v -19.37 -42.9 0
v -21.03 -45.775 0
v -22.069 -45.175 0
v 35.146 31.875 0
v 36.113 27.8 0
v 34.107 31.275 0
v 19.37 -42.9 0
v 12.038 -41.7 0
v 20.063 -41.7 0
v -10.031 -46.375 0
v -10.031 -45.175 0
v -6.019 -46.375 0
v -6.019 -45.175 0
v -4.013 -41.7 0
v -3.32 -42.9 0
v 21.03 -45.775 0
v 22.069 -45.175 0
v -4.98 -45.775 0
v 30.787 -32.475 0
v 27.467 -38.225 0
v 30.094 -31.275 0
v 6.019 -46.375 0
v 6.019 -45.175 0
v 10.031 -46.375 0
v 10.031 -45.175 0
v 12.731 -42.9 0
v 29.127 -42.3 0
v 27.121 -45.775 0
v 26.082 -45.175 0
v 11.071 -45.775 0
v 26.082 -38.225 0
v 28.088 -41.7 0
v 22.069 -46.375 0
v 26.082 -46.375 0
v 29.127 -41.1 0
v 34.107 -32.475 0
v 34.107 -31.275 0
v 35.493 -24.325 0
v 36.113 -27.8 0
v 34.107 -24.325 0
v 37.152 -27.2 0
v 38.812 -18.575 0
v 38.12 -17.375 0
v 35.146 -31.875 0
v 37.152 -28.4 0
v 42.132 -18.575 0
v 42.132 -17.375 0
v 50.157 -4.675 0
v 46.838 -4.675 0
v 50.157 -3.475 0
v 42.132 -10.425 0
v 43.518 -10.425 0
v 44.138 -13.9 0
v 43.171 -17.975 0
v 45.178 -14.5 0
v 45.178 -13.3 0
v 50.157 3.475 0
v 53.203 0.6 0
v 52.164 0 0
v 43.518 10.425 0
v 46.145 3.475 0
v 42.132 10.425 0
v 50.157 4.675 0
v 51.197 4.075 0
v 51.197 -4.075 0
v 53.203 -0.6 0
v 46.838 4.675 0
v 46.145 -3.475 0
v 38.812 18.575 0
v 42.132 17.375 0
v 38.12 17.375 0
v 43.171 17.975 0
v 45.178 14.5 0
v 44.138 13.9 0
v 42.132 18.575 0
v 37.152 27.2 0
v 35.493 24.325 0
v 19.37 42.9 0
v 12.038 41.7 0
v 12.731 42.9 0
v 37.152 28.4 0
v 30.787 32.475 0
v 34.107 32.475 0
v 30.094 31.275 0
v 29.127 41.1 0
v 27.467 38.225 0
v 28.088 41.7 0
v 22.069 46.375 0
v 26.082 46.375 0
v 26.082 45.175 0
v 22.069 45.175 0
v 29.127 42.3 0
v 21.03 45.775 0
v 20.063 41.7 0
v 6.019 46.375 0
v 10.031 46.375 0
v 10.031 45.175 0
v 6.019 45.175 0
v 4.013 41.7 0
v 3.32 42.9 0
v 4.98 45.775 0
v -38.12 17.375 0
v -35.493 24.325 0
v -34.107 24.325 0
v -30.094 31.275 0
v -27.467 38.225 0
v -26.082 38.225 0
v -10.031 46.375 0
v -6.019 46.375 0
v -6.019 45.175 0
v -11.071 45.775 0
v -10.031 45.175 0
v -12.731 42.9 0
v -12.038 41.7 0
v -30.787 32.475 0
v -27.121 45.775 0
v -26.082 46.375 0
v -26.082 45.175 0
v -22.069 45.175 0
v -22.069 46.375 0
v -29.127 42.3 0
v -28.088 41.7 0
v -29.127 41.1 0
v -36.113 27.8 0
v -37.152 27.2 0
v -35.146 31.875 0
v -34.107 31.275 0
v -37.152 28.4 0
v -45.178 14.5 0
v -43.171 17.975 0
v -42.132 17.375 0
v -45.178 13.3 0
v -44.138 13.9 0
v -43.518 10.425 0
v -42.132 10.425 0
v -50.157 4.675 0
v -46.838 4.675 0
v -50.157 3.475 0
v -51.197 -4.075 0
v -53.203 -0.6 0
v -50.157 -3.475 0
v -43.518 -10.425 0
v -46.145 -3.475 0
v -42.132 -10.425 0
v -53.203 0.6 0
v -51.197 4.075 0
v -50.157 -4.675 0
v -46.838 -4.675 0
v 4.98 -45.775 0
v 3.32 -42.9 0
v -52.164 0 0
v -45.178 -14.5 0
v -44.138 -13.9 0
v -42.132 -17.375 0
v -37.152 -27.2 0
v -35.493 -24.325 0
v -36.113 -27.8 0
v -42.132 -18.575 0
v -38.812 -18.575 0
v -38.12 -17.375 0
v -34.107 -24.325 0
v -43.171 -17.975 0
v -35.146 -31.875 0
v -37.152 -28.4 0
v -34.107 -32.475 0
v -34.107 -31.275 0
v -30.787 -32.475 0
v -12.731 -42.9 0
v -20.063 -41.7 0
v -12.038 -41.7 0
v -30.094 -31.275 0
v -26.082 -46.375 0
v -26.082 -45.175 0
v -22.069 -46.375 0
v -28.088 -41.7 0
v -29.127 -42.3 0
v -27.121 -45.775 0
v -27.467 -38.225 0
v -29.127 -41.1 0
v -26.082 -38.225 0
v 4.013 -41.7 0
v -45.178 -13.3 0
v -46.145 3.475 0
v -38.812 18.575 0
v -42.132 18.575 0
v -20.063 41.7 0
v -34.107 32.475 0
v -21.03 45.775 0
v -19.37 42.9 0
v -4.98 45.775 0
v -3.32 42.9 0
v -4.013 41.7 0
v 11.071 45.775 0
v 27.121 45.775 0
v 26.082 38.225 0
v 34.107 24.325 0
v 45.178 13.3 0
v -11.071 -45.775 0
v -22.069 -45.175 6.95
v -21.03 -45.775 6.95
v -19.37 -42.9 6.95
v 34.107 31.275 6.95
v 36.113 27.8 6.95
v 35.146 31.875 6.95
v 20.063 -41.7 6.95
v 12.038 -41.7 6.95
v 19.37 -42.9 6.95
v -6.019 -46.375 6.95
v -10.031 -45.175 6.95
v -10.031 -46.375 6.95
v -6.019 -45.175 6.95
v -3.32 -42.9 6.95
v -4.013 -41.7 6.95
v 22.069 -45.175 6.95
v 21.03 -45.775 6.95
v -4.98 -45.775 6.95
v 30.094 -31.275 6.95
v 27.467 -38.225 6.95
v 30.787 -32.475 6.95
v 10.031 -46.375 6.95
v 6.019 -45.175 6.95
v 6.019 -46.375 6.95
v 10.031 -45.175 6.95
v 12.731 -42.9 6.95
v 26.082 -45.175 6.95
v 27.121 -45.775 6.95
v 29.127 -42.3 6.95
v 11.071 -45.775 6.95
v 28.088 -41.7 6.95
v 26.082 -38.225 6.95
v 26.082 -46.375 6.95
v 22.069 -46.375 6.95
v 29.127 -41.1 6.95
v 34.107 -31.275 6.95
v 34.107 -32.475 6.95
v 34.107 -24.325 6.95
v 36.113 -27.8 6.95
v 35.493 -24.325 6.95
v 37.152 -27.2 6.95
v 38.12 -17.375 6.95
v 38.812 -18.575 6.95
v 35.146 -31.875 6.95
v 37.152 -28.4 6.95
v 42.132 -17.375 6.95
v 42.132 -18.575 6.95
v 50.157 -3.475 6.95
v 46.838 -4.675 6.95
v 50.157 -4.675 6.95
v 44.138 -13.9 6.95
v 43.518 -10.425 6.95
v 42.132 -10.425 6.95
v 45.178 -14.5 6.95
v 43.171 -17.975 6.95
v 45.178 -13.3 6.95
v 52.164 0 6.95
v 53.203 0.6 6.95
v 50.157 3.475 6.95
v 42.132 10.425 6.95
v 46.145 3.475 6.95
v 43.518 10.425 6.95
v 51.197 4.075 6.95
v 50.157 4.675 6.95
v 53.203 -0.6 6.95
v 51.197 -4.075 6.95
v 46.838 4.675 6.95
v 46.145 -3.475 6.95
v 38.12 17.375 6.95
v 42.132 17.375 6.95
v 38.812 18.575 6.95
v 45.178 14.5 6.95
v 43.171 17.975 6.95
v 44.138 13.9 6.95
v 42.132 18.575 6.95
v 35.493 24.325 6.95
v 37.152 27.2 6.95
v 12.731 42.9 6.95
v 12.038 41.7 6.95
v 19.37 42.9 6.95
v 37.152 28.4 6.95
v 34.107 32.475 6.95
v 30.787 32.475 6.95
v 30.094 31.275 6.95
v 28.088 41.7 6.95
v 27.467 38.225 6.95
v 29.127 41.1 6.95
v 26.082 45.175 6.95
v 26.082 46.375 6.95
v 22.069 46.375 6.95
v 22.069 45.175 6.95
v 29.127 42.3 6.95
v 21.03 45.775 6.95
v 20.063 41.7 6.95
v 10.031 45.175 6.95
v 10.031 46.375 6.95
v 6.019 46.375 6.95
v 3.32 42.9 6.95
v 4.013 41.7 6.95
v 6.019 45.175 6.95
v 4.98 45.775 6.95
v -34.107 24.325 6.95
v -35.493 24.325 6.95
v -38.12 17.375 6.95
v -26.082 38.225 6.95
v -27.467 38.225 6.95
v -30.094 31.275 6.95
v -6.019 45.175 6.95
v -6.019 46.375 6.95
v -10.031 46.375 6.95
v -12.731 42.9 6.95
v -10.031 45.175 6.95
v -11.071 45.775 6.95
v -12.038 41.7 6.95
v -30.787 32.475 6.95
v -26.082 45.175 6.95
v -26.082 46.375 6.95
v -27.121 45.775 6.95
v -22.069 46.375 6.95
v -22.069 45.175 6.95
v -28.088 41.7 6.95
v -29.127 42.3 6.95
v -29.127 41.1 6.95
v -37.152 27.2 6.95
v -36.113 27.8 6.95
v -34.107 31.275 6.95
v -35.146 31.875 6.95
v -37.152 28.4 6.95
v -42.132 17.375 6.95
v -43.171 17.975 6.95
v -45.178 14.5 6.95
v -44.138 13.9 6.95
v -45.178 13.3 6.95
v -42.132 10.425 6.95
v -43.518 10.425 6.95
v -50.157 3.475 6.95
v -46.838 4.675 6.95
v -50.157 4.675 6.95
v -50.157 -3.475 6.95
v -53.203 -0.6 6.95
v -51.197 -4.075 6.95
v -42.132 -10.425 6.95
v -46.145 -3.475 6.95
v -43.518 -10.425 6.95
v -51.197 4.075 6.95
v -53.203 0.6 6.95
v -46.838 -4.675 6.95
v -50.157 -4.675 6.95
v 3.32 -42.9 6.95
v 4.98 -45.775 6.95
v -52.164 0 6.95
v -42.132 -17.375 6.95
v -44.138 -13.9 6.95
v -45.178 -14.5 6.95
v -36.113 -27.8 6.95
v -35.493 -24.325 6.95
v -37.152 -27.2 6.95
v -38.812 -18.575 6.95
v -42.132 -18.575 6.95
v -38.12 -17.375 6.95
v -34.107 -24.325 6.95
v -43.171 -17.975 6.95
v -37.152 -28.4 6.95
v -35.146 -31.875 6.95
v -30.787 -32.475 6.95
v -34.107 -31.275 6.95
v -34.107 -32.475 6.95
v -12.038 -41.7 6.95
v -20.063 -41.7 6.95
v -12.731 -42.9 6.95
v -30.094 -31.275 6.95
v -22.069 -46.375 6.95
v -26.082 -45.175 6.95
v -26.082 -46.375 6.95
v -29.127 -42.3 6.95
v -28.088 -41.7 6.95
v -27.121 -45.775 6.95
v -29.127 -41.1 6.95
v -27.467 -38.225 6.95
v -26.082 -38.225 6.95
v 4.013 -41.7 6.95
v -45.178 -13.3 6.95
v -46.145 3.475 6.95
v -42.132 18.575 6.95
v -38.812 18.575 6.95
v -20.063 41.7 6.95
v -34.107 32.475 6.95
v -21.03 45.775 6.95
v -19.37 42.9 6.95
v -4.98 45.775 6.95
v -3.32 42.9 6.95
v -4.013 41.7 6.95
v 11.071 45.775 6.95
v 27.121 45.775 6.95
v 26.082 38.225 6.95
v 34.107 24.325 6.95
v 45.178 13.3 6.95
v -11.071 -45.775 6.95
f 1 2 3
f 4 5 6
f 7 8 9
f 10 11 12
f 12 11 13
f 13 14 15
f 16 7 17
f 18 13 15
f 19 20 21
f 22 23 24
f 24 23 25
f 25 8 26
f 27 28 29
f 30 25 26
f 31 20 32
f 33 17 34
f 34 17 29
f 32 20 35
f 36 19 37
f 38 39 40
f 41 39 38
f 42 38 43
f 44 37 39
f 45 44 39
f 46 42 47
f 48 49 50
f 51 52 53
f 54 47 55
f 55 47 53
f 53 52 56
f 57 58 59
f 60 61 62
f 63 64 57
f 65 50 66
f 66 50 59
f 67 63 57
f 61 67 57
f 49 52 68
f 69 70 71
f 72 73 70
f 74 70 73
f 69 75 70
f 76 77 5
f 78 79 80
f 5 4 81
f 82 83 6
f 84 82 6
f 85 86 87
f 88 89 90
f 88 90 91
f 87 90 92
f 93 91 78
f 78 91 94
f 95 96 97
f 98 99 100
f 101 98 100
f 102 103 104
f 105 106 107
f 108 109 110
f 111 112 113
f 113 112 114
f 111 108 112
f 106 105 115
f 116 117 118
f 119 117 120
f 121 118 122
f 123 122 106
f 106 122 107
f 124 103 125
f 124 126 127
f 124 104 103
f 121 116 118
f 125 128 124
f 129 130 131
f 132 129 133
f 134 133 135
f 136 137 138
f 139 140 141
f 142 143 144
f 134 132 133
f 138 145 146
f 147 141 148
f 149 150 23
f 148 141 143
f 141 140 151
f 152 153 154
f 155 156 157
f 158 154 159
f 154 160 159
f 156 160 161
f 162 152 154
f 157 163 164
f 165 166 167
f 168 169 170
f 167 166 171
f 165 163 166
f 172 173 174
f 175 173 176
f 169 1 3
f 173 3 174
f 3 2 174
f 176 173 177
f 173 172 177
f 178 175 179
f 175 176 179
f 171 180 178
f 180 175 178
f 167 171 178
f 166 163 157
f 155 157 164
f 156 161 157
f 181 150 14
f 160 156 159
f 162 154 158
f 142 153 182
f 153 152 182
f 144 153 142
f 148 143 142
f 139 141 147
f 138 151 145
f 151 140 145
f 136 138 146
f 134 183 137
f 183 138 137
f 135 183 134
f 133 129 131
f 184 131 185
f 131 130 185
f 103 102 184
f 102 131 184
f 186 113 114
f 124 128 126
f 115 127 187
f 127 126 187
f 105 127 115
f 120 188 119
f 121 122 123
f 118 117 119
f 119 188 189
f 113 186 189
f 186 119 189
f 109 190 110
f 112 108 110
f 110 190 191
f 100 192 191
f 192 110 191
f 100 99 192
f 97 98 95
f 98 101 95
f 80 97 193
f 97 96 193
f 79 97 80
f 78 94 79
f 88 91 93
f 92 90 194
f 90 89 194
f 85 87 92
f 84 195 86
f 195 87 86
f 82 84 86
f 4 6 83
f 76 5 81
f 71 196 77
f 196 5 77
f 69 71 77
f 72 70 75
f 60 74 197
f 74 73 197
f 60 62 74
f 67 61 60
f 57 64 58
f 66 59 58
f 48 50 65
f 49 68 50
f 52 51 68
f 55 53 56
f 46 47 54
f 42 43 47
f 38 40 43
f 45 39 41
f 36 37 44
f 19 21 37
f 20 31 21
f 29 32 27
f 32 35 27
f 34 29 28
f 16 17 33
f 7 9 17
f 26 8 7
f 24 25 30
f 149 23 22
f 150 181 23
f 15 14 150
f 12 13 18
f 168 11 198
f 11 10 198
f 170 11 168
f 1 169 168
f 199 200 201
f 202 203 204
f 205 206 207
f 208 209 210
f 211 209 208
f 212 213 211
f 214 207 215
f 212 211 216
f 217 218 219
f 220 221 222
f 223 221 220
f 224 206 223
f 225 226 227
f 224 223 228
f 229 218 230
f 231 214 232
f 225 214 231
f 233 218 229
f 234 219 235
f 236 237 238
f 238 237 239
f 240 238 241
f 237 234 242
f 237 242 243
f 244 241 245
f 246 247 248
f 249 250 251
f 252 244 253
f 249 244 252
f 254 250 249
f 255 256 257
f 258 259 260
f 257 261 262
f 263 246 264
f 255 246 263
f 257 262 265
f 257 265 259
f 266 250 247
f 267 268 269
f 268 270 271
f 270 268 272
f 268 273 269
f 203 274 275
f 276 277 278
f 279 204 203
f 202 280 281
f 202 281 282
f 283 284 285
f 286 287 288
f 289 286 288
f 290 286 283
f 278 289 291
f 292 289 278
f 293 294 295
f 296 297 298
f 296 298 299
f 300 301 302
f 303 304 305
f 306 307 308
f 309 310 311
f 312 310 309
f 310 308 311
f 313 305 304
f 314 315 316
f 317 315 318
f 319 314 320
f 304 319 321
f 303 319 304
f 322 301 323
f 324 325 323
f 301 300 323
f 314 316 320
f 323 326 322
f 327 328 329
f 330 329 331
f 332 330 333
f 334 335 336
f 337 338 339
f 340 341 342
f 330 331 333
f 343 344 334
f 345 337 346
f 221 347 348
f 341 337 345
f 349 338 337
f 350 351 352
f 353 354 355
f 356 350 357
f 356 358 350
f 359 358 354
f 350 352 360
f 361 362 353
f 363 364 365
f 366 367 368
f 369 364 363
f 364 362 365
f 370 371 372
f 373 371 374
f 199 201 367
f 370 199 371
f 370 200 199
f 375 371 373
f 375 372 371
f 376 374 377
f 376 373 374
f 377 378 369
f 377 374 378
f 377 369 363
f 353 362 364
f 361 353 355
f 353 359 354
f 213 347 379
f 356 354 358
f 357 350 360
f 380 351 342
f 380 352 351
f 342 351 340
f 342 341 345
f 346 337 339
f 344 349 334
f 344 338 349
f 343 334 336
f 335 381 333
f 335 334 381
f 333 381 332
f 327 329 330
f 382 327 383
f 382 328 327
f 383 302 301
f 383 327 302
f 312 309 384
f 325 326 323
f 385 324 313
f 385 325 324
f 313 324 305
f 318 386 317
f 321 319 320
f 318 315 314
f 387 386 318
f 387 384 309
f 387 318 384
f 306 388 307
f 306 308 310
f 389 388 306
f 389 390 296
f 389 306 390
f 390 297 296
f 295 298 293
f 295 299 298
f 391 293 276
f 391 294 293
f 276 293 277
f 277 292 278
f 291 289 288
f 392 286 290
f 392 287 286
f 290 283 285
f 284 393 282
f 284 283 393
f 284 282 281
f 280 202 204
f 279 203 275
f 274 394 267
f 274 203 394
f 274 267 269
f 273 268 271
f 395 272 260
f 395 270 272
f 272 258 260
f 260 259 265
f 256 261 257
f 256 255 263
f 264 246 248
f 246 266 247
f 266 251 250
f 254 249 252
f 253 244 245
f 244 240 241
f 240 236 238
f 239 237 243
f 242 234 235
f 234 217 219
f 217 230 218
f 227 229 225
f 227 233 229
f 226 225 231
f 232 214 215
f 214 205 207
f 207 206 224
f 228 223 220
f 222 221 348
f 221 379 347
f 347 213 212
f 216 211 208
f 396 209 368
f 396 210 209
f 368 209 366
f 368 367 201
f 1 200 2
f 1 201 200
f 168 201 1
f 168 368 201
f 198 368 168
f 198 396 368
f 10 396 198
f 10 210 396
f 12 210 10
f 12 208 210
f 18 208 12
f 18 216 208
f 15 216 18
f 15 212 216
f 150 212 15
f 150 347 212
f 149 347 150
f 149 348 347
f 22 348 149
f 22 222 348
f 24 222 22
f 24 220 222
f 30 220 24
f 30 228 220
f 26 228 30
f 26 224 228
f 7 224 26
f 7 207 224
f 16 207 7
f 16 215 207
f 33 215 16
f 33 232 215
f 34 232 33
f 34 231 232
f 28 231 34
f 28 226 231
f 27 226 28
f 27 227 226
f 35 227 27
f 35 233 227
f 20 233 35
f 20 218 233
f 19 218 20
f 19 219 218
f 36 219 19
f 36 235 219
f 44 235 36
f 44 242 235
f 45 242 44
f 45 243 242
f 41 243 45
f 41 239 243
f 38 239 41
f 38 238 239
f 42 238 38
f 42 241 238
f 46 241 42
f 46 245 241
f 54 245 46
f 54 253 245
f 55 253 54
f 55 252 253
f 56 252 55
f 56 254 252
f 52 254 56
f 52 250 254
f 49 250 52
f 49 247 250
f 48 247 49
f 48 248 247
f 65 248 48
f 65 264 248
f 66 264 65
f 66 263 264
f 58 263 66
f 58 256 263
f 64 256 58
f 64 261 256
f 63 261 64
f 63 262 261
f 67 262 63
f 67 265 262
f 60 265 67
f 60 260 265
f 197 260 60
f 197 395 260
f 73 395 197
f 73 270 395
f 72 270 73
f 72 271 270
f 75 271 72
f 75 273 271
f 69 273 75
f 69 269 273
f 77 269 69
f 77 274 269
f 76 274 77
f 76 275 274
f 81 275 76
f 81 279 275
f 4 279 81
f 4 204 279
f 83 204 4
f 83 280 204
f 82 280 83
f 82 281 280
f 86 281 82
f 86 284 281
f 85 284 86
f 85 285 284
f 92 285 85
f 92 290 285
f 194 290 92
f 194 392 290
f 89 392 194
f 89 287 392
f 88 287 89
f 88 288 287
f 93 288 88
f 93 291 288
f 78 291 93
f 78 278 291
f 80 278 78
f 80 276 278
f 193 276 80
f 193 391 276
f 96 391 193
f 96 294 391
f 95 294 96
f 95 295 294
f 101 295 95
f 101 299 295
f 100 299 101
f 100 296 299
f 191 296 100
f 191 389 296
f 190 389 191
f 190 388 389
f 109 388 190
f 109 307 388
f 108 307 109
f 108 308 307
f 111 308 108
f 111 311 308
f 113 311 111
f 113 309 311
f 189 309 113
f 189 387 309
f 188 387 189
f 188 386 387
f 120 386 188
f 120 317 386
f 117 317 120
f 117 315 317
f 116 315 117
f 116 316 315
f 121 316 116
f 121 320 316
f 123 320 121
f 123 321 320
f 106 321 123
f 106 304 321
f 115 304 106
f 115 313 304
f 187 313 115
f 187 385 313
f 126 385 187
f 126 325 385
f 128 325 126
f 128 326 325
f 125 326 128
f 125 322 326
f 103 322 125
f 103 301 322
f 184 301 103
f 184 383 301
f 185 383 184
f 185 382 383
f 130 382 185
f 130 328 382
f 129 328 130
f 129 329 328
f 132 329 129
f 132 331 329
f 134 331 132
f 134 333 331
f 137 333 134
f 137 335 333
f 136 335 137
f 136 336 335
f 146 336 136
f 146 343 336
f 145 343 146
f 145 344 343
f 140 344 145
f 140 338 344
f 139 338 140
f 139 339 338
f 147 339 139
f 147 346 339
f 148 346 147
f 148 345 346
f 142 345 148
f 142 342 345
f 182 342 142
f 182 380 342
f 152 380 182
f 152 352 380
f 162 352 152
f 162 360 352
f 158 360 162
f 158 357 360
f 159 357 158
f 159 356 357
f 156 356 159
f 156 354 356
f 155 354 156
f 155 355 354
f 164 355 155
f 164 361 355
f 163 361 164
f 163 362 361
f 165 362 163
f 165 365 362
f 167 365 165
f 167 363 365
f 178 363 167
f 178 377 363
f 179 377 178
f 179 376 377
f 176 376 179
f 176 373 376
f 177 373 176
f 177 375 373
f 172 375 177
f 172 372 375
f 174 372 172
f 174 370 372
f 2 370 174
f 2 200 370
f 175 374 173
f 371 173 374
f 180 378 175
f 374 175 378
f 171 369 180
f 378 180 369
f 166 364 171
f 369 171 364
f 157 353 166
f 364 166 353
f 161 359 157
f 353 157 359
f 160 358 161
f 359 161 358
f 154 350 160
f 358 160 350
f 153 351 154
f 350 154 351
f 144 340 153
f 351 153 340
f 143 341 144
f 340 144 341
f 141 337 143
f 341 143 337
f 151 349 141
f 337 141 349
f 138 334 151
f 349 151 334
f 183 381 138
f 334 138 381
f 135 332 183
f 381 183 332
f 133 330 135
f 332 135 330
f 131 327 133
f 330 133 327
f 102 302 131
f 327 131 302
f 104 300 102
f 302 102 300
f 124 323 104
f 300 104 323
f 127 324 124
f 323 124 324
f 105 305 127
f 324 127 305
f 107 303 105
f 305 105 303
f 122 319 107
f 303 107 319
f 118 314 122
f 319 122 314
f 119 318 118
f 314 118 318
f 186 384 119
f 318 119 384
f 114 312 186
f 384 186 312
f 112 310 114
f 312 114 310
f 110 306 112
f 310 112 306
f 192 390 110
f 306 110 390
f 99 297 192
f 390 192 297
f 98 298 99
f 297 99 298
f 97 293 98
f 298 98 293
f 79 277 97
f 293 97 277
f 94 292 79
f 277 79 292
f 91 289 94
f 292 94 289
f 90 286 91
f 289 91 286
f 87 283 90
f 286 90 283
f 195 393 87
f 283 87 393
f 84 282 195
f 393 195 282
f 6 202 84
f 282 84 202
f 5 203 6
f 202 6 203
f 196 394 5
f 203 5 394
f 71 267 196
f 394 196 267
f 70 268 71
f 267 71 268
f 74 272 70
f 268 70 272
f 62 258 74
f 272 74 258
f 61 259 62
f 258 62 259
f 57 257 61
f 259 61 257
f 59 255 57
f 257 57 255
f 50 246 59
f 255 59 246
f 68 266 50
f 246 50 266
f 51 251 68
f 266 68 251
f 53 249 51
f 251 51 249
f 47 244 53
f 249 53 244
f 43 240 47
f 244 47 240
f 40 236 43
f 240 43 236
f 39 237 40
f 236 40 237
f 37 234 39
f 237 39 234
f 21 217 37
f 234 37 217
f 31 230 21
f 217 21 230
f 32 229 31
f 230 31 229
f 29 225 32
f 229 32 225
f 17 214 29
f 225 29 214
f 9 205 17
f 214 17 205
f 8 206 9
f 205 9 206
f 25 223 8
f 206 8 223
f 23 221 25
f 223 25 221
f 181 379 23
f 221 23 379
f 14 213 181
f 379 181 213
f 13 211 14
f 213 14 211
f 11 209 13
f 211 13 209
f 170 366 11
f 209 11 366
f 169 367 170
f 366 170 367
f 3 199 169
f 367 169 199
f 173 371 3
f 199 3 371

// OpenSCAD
widthAcrossFlats = 6.95;
sideLength = 4;
height=0;
thickness=1.2;

pencilsAcross = sideLength * 4 - 3;
circumscribedDiameter = widthAcrossFlats * 2 / sqrt(3);

module borderize(t){
  difference(){
    offset(t) children();
    children();
  }
}


mat = [
    [cos(0), cos(120), cos(240)],
    [sin(0), sin(120), sin(240)]
  ];
dx = sideLength - 1;
linear_extrude(height ? height : widthAcrossFlats) borderize(thickness){
  for (a = [0:dx], b = [0:dx], c = [0:dx]) {
    #translate(mat * [a, b, c] * circumscribedDiameter * 2) circle(d = circumscribedDiameter, $fn = 6);
  }
  circle(d=circumscribedDiameter*(sideLength*4-4), $fn=6);
}
